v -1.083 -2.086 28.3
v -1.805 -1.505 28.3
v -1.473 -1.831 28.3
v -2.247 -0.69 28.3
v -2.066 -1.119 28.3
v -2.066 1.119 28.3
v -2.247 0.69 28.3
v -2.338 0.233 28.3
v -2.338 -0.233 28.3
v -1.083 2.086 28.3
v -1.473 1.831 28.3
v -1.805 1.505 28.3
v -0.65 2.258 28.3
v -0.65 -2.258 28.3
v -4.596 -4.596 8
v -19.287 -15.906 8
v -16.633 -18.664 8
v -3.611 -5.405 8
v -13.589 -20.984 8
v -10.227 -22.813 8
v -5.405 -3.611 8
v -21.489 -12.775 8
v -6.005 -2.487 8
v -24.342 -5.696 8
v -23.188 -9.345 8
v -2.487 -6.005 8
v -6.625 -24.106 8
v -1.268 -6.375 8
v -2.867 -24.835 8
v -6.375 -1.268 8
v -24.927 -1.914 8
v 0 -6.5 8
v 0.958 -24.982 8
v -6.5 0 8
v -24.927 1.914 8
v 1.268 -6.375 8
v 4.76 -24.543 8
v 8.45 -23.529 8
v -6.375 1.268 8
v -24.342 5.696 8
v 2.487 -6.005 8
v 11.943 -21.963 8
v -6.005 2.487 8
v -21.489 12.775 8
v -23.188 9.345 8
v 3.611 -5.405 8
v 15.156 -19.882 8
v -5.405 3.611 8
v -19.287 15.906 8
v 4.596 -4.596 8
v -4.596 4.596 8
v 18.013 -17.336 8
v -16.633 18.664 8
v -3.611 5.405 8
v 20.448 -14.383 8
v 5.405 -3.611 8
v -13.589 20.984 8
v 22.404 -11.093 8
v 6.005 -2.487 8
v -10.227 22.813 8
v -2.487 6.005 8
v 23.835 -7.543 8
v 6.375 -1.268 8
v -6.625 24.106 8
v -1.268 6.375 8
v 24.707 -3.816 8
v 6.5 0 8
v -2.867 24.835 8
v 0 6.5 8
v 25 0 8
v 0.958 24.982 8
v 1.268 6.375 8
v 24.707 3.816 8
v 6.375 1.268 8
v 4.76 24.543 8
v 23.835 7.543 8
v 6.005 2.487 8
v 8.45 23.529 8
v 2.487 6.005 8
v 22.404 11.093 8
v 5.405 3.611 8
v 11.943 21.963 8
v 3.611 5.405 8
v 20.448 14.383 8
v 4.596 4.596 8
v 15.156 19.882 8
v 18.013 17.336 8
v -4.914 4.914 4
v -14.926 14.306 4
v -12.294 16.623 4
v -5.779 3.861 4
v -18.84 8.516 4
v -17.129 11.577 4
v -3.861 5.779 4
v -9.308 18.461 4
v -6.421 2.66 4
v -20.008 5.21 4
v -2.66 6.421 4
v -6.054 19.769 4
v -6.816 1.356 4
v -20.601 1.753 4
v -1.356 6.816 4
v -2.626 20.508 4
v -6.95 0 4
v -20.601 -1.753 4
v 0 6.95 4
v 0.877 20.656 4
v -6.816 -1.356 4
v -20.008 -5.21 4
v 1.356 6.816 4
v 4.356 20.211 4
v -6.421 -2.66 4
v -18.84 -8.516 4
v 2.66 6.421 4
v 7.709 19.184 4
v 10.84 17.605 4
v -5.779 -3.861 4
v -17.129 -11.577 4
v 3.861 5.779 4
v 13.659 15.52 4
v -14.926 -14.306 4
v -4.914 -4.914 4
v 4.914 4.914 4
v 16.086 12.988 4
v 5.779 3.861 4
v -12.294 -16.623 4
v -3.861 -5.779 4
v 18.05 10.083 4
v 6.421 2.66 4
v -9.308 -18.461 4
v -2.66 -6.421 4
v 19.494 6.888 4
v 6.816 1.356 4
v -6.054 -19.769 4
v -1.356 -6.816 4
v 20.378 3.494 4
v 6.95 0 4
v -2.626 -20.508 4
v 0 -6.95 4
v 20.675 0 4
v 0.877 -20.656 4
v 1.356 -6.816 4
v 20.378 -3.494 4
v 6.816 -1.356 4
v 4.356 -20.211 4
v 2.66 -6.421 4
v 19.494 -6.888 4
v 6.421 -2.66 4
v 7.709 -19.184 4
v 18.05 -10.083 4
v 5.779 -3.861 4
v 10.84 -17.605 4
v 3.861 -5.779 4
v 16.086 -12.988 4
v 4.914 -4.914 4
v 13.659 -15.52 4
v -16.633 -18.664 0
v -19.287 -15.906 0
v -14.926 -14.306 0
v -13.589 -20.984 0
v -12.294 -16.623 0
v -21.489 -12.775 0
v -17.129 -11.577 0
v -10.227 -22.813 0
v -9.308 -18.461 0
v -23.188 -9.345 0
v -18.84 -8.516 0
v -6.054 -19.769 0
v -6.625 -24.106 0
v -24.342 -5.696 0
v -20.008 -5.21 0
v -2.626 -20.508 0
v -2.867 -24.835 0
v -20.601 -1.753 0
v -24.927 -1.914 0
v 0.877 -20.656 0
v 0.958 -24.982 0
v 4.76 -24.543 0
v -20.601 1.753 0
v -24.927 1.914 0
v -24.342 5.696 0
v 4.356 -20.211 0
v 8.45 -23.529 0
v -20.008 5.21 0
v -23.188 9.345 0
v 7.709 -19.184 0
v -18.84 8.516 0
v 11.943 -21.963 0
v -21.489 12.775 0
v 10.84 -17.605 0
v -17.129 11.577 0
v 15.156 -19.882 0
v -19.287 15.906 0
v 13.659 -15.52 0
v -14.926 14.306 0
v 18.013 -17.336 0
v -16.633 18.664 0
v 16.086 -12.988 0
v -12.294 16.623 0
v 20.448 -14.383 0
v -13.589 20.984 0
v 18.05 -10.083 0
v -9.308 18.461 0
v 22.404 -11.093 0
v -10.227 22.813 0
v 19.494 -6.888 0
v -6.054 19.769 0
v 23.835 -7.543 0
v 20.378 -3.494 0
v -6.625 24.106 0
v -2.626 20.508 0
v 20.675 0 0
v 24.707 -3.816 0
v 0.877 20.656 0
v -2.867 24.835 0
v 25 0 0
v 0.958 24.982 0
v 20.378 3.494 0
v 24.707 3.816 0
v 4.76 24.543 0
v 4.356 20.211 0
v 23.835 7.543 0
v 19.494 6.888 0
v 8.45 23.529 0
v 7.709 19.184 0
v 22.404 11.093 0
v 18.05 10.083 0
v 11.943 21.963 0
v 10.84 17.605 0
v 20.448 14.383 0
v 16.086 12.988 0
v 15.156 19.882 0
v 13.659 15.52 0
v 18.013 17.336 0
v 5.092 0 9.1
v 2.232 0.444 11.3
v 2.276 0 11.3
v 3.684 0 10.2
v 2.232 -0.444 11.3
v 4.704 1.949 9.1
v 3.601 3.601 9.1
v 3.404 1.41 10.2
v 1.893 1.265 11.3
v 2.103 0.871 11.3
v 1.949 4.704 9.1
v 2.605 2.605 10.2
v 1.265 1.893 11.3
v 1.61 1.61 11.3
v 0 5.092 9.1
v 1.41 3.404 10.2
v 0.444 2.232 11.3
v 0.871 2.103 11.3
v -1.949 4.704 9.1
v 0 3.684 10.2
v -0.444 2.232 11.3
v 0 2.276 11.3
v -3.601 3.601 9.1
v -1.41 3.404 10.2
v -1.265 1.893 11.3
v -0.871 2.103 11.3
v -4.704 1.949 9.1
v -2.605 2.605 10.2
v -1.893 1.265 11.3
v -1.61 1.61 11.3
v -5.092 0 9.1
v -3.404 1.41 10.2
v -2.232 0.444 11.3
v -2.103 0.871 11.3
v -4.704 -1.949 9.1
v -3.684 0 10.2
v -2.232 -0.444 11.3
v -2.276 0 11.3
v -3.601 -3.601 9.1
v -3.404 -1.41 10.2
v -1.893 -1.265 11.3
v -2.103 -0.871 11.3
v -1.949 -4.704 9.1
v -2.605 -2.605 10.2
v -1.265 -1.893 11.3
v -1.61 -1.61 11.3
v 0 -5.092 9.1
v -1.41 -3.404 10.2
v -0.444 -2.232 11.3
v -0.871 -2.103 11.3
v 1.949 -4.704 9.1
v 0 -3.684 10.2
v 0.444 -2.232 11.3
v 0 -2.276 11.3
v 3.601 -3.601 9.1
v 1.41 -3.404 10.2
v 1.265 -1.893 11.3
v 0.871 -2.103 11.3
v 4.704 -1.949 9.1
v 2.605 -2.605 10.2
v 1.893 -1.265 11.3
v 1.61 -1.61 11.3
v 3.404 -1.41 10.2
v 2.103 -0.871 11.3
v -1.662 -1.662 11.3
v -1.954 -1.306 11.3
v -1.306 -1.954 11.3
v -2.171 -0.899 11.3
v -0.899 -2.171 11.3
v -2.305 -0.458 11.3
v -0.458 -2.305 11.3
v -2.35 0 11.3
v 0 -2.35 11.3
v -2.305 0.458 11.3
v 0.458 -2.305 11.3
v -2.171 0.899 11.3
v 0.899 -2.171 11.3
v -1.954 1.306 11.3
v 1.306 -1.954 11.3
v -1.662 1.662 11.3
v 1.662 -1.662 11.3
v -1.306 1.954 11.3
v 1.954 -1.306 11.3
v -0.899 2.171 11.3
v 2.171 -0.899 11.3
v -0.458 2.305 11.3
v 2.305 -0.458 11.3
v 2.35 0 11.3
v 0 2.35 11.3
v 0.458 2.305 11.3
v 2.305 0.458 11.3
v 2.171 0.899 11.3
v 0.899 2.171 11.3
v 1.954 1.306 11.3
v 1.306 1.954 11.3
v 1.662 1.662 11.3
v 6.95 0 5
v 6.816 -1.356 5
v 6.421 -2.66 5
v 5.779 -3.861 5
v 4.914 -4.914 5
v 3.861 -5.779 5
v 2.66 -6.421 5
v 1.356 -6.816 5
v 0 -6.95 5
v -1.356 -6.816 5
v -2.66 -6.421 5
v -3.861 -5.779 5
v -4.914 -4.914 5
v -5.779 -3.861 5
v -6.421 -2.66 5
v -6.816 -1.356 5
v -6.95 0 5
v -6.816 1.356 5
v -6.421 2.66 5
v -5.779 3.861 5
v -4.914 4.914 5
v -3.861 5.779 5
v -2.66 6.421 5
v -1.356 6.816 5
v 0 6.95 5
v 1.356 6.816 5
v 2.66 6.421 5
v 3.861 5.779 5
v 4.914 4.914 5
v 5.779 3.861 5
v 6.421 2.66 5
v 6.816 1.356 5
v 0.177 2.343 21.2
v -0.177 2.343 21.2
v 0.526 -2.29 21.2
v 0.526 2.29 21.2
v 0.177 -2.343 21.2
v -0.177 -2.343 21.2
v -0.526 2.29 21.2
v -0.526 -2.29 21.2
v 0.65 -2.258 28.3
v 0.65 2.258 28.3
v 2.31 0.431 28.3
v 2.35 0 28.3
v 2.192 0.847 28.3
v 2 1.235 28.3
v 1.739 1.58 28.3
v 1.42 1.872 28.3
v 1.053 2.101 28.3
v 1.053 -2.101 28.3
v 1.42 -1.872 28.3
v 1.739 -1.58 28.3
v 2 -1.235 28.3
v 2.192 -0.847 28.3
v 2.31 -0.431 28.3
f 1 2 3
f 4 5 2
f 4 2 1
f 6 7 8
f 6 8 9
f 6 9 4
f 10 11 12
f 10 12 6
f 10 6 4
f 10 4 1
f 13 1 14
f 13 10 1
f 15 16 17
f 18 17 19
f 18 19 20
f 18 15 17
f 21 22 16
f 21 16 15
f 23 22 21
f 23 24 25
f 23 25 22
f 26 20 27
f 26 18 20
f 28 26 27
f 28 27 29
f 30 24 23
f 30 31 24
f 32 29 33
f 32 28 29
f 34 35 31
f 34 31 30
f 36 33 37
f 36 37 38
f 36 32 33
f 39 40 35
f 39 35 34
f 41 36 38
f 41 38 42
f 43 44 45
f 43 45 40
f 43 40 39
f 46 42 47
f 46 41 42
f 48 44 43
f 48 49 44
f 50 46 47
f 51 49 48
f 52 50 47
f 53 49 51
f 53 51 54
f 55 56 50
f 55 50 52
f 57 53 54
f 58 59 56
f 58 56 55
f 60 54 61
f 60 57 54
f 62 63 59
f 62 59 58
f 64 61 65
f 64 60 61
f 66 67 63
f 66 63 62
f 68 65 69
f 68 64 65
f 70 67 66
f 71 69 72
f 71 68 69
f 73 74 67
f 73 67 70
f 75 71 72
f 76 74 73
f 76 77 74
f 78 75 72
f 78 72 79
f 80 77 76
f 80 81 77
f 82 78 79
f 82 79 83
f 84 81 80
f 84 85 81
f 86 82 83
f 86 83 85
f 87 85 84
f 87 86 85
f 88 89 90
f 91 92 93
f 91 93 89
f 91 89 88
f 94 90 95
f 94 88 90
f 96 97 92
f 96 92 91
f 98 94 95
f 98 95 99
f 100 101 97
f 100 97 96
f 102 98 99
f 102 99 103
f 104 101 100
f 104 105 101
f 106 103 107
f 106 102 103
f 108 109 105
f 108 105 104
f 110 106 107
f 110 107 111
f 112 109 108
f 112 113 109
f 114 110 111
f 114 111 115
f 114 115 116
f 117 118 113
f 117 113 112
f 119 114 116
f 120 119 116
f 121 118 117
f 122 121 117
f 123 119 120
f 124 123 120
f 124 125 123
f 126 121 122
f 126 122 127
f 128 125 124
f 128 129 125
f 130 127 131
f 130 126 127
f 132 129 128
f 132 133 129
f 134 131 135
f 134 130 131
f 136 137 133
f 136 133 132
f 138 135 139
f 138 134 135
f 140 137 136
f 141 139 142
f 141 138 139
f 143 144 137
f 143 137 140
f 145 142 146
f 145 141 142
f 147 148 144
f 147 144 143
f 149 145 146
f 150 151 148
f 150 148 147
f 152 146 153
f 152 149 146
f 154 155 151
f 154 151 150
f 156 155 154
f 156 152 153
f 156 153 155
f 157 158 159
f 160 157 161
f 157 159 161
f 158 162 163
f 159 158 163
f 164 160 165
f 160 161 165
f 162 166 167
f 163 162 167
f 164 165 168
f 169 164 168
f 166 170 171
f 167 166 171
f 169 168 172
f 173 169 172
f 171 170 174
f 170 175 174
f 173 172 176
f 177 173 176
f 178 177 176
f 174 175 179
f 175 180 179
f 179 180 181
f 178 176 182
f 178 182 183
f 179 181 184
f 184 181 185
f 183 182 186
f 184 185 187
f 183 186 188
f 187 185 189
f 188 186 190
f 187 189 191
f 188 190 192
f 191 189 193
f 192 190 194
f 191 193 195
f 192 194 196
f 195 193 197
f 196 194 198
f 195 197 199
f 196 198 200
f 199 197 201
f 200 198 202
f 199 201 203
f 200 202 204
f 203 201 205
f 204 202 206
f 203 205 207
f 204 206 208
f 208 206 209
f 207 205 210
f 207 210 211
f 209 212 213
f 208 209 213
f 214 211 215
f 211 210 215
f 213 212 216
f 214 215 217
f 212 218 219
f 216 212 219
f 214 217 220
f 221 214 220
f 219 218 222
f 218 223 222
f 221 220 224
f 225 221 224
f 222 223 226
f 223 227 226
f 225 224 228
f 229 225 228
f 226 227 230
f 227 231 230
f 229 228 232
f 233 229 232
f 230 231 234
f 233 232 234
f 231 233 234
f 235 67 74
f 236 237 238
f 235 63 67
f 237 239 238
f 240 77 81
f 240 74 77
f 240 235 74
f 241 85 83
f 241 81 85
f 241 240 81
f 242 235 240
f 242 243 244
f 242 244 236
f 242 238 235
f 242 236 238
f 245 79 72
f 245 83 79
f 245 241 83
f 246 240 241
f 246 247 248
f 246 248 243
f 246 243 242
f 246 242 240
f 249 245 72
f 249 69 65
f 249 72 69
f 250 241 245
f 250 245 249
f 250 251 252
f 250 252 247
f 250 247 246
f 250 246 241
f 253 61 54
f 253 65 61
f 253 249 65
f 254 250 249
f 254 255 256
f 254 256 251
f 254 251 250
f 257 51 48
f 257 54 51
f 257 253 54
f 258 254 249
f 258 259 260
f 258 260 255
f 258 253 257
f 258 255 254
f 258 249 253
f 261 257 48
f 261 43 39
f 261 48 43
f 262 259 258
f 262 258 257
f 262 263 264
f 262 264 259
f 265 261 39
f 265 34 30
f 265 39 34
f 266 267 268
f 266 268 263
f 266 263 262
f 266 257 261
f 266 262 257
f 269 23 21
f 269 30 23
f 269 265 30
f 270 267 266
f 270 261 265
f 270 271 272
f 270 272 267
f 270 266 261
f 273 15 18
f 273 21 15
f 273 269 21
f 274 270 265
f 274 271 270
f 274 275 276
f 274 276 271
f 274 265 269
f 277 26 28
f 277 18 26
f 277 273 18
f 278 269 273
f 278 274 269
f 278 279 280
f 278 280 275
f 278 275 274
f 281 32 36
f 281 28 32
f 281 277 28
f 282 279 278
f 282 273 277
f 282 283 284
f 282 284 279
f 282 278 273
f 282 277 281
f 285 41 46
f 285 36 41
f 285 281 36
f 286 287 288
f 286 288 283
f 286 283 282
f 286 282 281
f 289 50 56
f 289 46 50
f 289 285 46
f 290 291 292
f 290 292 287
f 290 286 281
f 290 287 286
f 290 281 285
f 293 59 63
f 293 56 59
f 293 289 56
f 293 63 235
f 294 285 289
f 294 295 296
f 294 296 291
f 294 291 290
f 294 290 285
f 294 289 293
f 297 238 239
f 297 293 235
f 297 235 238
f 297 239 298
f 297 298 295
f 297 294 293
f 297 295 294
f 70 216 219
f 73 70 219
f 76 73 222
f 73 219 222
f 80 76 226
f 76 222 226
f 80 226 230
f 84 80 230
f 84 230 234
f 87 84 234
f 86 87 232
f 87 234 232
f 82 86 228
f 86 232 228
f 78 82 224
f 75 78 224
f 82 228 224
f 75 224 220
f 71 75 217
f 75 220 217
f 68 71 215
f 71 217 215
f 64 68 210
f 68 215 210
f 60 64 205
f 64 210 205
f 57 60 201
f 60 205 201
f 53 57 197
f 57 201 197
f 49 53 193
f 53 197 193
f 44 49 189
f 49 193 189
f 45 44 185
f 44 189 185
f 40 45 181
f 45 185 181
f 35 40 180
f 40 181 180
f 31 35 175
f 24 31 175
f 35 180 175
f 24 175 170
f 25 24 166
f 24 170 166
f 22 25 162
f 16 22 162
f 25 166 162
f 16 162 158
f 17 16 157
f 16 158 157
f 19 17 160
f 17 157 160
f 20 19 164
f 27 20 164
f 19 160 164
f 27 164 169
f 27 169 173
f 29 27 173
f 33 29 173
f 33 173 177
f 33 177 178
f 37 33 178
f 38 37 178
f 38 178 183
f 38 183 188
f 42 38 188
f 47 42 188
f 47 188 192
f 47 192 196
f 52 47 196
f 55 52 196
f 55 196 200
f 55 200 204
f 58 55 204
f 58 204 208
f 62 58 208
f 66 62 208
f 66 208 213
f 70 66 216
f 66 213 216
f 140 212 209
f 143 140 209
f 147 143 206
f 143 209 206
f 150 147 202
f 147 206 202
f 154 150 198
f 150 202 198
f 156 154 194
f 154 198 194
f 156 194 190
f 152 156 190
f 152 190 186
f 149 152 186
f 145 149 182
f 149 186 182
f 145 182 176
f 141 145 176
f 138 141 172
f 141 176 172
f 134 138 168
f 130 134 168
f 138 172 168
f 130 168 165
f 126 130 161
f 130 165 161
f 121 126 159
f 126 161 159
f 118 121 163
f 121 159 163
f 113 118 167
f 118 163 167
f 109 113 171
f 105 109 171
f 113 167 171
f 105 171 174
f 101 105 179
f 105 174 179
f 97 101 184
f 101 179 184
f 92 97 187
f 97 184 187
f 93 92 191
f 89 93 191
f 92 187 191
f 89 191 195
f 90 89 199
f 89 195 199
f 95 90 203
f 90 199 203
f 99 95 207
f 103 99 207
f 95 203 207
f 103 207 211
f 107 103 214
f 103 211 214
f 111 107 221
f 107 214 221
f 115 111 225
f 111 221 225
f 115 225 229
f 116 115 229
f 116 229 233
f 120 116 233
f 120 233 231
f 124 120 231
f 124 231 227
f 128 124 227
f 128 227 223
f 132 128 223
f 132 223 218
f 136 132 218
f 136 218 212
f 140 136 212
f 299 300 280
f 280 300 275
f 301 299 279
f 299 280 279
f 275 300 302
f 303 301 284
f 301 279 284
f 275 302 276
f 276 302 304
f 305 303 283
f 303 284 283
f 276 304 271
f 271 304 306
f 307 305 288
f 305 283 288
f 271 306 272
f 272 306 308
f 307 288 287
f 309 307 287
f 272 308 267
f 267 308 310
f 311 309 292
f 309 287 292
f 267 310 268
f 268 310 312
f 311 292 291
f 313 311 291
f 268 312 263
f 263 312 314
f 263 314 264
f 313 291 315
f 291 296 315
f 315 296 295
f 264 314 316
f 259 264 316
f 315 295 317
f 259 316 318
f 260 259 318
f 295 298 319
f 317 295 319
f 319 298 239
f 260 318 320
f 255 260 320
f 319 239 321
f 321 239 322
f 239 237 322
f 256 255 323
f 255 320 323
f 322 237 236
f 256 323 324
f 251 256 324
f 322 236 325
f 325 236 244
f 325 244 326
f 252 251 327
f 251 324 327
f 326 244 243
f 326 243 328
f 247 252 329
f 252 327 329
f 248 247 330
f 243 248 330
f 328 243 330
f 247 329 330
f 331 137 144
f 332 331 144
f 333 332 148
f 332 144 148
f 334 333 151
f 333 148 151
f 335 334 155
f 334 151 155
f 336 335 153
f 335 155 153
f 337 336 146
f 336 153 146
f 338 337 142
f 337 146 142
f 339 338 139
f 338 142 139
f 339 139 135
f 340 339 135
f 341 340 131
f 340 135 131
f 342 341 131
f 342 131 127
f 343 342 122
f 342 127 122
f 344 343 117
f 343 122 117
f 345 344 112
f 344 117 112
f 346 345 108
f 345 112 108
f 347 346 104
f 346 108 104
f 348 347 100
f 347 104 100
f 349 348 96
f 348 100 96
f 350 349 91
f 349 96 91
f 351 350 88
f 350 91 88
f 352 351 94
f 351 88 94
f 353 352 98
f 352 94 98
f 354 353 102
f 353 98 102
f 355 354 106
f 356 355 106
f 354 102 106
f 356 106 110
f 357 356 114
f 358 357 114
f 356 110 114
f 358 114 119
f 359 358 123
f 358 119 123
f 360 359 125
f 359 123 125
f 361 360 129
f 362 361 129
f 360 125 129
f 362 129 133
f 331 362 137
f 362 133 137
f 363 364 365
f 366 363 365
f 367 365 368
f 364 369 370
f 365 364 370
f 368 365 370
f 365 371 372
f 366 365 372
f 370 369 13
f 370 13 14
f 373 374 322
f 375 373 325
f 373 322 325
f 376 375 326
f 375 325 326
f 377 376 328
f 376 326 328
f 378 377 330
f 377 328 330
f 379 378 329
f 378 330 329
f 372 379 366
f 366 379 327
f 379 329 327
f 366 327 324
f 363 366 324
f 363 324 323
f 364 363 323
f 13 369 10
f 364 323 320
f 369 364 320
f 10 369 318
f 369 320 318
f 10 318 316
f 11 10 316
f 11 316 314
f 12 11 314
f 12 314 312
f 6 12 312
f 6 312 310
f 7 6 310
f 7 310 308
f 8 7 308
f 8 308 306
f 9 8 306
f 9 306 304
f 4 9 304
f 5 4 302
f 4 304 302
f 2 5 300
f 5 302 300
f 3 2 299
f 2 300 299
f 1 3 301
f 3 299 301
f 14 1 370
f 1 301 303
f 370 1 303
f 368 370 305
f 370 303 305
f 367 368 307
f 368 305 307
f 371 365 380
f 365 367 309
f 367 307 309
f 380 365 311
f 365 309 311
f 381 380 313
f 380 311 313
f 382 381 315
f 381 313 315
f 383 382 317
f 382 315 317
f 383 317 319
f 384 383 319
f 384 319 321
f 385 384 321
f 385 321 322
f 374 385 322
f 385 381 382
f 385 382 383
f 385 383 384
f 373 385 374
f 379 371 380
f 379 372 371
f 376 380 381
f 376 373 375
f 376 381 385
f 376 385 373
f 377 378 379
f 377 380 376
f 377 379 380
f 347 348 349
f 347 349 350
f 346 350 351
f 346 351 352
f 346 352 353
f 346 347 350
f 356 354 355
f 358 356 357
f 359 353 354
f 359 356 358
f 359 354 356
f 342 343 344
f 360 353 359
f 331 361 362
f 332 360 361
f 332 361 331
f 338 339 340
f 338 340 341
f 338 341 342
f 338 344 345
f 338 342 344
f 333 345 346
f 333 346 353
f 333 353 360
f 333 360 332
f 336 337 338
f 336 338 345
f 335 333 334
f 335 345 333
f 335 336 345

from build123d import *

# Parameters (mm, degrees)
F0_R      = 25
F1_DEPTH  = 8
F2_R      = 20.675
F3_DEPTH  = 4
F4_R      = 6.95
F5_DEPTH  = 1
F6_R      = 6.5
F7_DEPTH  = 3.3
F7_TAPER  = 52
F8_R      = 2.35
F9_DEPTH  = 17
F11_DEPTH = 7.1
F11_TAPER = 1


# Not quite as in the source:
# - a feature names something its author has since deleted; it is built from what else it names


with BuildPart() as f1:
    # F0 (on Top) → F1 (new body)
    with BuildSketch(Plane.XY):
        Circle(F0_R)
    extrude(amount=F1_DEPTH)

    # F2 (on face) → F3 (cut)
    with BuildSketch(Plane(origin=(0, 0, 0), x_dir=(1, 0, 0), z_dir=(0, 0, -1))):
        Circle(F2_R)
    extrude(amount=-F3_DEPTH, mode=Mode.SUBTRACT)

    # F4 (on face) → F5 (cut)
    with BuildSketch(Plane(origin=(0, 0, 4), x_dir=(1, 0, 0), z_dir=(0, 0, -1))):
        Circle(F4_R)
    extrude(amount=-F5_DEPTH, mode=Mode.SUBTRACT)

    # F6 (on face) → F7 (join)
    with BuildSketch(Plane.XY.offset(8)):
        Circle(F6_R)
    extrude(amount=F7_DEPTH, taper=F7_TAPER)

    # F8 (on face) → F9 (join)
    with BuildSketch(Plane.XY.offset(11.3)):
        Circle(F8_R)
    extrude(amount=F9_DEPTH)

    # F10 (on face) → F11 (cut)
    with BuildSketch(Plane.XY.offset(28.3)):
        with BuildLine():
            ThreePointArc((-0.65, 2.2583179581), (0, 2.35), (0.65, 2.2583179581))
            Line((0.65, 2.2583179581), (0.65, 4))
            Line((0.65, 4), (-0.65, 4))
            Line((-0.65, 4), (-0.65, 2.2583179581))
        make_face()
        with BuildLine():
            ThreePointArc((-0.65, -2.2583179581), (0, -2.35), (0.65, -2.2583179581))
            Line((0.65, -2.2583179581), (0.65, 2.2583179581))
            ThreePointArc((0.65, 2.2583179581), (0, 2.35), (-0.65, 2.2583179581))
            Line((-0.65, 2.2583179581), (-0.65, -2.2583179581))
        make_face()
        with BuildLine():
            Line((-0.65, -4), (0.65, -4))
            Line((0.65, -4), (0.65, -2.2583179581))
            ThreePointArc((0.65, -2.2583179581), (0, -2.35), (-0.65, -2.2583179581))
            Line((-0.65, -2.2583179581), (-0.65, -4))
        make_face()
    extrude(amount=-F11_DEPTH, taper=F11_TAPER, mode=Mode.SUBTRACT)


solid = f1.part
